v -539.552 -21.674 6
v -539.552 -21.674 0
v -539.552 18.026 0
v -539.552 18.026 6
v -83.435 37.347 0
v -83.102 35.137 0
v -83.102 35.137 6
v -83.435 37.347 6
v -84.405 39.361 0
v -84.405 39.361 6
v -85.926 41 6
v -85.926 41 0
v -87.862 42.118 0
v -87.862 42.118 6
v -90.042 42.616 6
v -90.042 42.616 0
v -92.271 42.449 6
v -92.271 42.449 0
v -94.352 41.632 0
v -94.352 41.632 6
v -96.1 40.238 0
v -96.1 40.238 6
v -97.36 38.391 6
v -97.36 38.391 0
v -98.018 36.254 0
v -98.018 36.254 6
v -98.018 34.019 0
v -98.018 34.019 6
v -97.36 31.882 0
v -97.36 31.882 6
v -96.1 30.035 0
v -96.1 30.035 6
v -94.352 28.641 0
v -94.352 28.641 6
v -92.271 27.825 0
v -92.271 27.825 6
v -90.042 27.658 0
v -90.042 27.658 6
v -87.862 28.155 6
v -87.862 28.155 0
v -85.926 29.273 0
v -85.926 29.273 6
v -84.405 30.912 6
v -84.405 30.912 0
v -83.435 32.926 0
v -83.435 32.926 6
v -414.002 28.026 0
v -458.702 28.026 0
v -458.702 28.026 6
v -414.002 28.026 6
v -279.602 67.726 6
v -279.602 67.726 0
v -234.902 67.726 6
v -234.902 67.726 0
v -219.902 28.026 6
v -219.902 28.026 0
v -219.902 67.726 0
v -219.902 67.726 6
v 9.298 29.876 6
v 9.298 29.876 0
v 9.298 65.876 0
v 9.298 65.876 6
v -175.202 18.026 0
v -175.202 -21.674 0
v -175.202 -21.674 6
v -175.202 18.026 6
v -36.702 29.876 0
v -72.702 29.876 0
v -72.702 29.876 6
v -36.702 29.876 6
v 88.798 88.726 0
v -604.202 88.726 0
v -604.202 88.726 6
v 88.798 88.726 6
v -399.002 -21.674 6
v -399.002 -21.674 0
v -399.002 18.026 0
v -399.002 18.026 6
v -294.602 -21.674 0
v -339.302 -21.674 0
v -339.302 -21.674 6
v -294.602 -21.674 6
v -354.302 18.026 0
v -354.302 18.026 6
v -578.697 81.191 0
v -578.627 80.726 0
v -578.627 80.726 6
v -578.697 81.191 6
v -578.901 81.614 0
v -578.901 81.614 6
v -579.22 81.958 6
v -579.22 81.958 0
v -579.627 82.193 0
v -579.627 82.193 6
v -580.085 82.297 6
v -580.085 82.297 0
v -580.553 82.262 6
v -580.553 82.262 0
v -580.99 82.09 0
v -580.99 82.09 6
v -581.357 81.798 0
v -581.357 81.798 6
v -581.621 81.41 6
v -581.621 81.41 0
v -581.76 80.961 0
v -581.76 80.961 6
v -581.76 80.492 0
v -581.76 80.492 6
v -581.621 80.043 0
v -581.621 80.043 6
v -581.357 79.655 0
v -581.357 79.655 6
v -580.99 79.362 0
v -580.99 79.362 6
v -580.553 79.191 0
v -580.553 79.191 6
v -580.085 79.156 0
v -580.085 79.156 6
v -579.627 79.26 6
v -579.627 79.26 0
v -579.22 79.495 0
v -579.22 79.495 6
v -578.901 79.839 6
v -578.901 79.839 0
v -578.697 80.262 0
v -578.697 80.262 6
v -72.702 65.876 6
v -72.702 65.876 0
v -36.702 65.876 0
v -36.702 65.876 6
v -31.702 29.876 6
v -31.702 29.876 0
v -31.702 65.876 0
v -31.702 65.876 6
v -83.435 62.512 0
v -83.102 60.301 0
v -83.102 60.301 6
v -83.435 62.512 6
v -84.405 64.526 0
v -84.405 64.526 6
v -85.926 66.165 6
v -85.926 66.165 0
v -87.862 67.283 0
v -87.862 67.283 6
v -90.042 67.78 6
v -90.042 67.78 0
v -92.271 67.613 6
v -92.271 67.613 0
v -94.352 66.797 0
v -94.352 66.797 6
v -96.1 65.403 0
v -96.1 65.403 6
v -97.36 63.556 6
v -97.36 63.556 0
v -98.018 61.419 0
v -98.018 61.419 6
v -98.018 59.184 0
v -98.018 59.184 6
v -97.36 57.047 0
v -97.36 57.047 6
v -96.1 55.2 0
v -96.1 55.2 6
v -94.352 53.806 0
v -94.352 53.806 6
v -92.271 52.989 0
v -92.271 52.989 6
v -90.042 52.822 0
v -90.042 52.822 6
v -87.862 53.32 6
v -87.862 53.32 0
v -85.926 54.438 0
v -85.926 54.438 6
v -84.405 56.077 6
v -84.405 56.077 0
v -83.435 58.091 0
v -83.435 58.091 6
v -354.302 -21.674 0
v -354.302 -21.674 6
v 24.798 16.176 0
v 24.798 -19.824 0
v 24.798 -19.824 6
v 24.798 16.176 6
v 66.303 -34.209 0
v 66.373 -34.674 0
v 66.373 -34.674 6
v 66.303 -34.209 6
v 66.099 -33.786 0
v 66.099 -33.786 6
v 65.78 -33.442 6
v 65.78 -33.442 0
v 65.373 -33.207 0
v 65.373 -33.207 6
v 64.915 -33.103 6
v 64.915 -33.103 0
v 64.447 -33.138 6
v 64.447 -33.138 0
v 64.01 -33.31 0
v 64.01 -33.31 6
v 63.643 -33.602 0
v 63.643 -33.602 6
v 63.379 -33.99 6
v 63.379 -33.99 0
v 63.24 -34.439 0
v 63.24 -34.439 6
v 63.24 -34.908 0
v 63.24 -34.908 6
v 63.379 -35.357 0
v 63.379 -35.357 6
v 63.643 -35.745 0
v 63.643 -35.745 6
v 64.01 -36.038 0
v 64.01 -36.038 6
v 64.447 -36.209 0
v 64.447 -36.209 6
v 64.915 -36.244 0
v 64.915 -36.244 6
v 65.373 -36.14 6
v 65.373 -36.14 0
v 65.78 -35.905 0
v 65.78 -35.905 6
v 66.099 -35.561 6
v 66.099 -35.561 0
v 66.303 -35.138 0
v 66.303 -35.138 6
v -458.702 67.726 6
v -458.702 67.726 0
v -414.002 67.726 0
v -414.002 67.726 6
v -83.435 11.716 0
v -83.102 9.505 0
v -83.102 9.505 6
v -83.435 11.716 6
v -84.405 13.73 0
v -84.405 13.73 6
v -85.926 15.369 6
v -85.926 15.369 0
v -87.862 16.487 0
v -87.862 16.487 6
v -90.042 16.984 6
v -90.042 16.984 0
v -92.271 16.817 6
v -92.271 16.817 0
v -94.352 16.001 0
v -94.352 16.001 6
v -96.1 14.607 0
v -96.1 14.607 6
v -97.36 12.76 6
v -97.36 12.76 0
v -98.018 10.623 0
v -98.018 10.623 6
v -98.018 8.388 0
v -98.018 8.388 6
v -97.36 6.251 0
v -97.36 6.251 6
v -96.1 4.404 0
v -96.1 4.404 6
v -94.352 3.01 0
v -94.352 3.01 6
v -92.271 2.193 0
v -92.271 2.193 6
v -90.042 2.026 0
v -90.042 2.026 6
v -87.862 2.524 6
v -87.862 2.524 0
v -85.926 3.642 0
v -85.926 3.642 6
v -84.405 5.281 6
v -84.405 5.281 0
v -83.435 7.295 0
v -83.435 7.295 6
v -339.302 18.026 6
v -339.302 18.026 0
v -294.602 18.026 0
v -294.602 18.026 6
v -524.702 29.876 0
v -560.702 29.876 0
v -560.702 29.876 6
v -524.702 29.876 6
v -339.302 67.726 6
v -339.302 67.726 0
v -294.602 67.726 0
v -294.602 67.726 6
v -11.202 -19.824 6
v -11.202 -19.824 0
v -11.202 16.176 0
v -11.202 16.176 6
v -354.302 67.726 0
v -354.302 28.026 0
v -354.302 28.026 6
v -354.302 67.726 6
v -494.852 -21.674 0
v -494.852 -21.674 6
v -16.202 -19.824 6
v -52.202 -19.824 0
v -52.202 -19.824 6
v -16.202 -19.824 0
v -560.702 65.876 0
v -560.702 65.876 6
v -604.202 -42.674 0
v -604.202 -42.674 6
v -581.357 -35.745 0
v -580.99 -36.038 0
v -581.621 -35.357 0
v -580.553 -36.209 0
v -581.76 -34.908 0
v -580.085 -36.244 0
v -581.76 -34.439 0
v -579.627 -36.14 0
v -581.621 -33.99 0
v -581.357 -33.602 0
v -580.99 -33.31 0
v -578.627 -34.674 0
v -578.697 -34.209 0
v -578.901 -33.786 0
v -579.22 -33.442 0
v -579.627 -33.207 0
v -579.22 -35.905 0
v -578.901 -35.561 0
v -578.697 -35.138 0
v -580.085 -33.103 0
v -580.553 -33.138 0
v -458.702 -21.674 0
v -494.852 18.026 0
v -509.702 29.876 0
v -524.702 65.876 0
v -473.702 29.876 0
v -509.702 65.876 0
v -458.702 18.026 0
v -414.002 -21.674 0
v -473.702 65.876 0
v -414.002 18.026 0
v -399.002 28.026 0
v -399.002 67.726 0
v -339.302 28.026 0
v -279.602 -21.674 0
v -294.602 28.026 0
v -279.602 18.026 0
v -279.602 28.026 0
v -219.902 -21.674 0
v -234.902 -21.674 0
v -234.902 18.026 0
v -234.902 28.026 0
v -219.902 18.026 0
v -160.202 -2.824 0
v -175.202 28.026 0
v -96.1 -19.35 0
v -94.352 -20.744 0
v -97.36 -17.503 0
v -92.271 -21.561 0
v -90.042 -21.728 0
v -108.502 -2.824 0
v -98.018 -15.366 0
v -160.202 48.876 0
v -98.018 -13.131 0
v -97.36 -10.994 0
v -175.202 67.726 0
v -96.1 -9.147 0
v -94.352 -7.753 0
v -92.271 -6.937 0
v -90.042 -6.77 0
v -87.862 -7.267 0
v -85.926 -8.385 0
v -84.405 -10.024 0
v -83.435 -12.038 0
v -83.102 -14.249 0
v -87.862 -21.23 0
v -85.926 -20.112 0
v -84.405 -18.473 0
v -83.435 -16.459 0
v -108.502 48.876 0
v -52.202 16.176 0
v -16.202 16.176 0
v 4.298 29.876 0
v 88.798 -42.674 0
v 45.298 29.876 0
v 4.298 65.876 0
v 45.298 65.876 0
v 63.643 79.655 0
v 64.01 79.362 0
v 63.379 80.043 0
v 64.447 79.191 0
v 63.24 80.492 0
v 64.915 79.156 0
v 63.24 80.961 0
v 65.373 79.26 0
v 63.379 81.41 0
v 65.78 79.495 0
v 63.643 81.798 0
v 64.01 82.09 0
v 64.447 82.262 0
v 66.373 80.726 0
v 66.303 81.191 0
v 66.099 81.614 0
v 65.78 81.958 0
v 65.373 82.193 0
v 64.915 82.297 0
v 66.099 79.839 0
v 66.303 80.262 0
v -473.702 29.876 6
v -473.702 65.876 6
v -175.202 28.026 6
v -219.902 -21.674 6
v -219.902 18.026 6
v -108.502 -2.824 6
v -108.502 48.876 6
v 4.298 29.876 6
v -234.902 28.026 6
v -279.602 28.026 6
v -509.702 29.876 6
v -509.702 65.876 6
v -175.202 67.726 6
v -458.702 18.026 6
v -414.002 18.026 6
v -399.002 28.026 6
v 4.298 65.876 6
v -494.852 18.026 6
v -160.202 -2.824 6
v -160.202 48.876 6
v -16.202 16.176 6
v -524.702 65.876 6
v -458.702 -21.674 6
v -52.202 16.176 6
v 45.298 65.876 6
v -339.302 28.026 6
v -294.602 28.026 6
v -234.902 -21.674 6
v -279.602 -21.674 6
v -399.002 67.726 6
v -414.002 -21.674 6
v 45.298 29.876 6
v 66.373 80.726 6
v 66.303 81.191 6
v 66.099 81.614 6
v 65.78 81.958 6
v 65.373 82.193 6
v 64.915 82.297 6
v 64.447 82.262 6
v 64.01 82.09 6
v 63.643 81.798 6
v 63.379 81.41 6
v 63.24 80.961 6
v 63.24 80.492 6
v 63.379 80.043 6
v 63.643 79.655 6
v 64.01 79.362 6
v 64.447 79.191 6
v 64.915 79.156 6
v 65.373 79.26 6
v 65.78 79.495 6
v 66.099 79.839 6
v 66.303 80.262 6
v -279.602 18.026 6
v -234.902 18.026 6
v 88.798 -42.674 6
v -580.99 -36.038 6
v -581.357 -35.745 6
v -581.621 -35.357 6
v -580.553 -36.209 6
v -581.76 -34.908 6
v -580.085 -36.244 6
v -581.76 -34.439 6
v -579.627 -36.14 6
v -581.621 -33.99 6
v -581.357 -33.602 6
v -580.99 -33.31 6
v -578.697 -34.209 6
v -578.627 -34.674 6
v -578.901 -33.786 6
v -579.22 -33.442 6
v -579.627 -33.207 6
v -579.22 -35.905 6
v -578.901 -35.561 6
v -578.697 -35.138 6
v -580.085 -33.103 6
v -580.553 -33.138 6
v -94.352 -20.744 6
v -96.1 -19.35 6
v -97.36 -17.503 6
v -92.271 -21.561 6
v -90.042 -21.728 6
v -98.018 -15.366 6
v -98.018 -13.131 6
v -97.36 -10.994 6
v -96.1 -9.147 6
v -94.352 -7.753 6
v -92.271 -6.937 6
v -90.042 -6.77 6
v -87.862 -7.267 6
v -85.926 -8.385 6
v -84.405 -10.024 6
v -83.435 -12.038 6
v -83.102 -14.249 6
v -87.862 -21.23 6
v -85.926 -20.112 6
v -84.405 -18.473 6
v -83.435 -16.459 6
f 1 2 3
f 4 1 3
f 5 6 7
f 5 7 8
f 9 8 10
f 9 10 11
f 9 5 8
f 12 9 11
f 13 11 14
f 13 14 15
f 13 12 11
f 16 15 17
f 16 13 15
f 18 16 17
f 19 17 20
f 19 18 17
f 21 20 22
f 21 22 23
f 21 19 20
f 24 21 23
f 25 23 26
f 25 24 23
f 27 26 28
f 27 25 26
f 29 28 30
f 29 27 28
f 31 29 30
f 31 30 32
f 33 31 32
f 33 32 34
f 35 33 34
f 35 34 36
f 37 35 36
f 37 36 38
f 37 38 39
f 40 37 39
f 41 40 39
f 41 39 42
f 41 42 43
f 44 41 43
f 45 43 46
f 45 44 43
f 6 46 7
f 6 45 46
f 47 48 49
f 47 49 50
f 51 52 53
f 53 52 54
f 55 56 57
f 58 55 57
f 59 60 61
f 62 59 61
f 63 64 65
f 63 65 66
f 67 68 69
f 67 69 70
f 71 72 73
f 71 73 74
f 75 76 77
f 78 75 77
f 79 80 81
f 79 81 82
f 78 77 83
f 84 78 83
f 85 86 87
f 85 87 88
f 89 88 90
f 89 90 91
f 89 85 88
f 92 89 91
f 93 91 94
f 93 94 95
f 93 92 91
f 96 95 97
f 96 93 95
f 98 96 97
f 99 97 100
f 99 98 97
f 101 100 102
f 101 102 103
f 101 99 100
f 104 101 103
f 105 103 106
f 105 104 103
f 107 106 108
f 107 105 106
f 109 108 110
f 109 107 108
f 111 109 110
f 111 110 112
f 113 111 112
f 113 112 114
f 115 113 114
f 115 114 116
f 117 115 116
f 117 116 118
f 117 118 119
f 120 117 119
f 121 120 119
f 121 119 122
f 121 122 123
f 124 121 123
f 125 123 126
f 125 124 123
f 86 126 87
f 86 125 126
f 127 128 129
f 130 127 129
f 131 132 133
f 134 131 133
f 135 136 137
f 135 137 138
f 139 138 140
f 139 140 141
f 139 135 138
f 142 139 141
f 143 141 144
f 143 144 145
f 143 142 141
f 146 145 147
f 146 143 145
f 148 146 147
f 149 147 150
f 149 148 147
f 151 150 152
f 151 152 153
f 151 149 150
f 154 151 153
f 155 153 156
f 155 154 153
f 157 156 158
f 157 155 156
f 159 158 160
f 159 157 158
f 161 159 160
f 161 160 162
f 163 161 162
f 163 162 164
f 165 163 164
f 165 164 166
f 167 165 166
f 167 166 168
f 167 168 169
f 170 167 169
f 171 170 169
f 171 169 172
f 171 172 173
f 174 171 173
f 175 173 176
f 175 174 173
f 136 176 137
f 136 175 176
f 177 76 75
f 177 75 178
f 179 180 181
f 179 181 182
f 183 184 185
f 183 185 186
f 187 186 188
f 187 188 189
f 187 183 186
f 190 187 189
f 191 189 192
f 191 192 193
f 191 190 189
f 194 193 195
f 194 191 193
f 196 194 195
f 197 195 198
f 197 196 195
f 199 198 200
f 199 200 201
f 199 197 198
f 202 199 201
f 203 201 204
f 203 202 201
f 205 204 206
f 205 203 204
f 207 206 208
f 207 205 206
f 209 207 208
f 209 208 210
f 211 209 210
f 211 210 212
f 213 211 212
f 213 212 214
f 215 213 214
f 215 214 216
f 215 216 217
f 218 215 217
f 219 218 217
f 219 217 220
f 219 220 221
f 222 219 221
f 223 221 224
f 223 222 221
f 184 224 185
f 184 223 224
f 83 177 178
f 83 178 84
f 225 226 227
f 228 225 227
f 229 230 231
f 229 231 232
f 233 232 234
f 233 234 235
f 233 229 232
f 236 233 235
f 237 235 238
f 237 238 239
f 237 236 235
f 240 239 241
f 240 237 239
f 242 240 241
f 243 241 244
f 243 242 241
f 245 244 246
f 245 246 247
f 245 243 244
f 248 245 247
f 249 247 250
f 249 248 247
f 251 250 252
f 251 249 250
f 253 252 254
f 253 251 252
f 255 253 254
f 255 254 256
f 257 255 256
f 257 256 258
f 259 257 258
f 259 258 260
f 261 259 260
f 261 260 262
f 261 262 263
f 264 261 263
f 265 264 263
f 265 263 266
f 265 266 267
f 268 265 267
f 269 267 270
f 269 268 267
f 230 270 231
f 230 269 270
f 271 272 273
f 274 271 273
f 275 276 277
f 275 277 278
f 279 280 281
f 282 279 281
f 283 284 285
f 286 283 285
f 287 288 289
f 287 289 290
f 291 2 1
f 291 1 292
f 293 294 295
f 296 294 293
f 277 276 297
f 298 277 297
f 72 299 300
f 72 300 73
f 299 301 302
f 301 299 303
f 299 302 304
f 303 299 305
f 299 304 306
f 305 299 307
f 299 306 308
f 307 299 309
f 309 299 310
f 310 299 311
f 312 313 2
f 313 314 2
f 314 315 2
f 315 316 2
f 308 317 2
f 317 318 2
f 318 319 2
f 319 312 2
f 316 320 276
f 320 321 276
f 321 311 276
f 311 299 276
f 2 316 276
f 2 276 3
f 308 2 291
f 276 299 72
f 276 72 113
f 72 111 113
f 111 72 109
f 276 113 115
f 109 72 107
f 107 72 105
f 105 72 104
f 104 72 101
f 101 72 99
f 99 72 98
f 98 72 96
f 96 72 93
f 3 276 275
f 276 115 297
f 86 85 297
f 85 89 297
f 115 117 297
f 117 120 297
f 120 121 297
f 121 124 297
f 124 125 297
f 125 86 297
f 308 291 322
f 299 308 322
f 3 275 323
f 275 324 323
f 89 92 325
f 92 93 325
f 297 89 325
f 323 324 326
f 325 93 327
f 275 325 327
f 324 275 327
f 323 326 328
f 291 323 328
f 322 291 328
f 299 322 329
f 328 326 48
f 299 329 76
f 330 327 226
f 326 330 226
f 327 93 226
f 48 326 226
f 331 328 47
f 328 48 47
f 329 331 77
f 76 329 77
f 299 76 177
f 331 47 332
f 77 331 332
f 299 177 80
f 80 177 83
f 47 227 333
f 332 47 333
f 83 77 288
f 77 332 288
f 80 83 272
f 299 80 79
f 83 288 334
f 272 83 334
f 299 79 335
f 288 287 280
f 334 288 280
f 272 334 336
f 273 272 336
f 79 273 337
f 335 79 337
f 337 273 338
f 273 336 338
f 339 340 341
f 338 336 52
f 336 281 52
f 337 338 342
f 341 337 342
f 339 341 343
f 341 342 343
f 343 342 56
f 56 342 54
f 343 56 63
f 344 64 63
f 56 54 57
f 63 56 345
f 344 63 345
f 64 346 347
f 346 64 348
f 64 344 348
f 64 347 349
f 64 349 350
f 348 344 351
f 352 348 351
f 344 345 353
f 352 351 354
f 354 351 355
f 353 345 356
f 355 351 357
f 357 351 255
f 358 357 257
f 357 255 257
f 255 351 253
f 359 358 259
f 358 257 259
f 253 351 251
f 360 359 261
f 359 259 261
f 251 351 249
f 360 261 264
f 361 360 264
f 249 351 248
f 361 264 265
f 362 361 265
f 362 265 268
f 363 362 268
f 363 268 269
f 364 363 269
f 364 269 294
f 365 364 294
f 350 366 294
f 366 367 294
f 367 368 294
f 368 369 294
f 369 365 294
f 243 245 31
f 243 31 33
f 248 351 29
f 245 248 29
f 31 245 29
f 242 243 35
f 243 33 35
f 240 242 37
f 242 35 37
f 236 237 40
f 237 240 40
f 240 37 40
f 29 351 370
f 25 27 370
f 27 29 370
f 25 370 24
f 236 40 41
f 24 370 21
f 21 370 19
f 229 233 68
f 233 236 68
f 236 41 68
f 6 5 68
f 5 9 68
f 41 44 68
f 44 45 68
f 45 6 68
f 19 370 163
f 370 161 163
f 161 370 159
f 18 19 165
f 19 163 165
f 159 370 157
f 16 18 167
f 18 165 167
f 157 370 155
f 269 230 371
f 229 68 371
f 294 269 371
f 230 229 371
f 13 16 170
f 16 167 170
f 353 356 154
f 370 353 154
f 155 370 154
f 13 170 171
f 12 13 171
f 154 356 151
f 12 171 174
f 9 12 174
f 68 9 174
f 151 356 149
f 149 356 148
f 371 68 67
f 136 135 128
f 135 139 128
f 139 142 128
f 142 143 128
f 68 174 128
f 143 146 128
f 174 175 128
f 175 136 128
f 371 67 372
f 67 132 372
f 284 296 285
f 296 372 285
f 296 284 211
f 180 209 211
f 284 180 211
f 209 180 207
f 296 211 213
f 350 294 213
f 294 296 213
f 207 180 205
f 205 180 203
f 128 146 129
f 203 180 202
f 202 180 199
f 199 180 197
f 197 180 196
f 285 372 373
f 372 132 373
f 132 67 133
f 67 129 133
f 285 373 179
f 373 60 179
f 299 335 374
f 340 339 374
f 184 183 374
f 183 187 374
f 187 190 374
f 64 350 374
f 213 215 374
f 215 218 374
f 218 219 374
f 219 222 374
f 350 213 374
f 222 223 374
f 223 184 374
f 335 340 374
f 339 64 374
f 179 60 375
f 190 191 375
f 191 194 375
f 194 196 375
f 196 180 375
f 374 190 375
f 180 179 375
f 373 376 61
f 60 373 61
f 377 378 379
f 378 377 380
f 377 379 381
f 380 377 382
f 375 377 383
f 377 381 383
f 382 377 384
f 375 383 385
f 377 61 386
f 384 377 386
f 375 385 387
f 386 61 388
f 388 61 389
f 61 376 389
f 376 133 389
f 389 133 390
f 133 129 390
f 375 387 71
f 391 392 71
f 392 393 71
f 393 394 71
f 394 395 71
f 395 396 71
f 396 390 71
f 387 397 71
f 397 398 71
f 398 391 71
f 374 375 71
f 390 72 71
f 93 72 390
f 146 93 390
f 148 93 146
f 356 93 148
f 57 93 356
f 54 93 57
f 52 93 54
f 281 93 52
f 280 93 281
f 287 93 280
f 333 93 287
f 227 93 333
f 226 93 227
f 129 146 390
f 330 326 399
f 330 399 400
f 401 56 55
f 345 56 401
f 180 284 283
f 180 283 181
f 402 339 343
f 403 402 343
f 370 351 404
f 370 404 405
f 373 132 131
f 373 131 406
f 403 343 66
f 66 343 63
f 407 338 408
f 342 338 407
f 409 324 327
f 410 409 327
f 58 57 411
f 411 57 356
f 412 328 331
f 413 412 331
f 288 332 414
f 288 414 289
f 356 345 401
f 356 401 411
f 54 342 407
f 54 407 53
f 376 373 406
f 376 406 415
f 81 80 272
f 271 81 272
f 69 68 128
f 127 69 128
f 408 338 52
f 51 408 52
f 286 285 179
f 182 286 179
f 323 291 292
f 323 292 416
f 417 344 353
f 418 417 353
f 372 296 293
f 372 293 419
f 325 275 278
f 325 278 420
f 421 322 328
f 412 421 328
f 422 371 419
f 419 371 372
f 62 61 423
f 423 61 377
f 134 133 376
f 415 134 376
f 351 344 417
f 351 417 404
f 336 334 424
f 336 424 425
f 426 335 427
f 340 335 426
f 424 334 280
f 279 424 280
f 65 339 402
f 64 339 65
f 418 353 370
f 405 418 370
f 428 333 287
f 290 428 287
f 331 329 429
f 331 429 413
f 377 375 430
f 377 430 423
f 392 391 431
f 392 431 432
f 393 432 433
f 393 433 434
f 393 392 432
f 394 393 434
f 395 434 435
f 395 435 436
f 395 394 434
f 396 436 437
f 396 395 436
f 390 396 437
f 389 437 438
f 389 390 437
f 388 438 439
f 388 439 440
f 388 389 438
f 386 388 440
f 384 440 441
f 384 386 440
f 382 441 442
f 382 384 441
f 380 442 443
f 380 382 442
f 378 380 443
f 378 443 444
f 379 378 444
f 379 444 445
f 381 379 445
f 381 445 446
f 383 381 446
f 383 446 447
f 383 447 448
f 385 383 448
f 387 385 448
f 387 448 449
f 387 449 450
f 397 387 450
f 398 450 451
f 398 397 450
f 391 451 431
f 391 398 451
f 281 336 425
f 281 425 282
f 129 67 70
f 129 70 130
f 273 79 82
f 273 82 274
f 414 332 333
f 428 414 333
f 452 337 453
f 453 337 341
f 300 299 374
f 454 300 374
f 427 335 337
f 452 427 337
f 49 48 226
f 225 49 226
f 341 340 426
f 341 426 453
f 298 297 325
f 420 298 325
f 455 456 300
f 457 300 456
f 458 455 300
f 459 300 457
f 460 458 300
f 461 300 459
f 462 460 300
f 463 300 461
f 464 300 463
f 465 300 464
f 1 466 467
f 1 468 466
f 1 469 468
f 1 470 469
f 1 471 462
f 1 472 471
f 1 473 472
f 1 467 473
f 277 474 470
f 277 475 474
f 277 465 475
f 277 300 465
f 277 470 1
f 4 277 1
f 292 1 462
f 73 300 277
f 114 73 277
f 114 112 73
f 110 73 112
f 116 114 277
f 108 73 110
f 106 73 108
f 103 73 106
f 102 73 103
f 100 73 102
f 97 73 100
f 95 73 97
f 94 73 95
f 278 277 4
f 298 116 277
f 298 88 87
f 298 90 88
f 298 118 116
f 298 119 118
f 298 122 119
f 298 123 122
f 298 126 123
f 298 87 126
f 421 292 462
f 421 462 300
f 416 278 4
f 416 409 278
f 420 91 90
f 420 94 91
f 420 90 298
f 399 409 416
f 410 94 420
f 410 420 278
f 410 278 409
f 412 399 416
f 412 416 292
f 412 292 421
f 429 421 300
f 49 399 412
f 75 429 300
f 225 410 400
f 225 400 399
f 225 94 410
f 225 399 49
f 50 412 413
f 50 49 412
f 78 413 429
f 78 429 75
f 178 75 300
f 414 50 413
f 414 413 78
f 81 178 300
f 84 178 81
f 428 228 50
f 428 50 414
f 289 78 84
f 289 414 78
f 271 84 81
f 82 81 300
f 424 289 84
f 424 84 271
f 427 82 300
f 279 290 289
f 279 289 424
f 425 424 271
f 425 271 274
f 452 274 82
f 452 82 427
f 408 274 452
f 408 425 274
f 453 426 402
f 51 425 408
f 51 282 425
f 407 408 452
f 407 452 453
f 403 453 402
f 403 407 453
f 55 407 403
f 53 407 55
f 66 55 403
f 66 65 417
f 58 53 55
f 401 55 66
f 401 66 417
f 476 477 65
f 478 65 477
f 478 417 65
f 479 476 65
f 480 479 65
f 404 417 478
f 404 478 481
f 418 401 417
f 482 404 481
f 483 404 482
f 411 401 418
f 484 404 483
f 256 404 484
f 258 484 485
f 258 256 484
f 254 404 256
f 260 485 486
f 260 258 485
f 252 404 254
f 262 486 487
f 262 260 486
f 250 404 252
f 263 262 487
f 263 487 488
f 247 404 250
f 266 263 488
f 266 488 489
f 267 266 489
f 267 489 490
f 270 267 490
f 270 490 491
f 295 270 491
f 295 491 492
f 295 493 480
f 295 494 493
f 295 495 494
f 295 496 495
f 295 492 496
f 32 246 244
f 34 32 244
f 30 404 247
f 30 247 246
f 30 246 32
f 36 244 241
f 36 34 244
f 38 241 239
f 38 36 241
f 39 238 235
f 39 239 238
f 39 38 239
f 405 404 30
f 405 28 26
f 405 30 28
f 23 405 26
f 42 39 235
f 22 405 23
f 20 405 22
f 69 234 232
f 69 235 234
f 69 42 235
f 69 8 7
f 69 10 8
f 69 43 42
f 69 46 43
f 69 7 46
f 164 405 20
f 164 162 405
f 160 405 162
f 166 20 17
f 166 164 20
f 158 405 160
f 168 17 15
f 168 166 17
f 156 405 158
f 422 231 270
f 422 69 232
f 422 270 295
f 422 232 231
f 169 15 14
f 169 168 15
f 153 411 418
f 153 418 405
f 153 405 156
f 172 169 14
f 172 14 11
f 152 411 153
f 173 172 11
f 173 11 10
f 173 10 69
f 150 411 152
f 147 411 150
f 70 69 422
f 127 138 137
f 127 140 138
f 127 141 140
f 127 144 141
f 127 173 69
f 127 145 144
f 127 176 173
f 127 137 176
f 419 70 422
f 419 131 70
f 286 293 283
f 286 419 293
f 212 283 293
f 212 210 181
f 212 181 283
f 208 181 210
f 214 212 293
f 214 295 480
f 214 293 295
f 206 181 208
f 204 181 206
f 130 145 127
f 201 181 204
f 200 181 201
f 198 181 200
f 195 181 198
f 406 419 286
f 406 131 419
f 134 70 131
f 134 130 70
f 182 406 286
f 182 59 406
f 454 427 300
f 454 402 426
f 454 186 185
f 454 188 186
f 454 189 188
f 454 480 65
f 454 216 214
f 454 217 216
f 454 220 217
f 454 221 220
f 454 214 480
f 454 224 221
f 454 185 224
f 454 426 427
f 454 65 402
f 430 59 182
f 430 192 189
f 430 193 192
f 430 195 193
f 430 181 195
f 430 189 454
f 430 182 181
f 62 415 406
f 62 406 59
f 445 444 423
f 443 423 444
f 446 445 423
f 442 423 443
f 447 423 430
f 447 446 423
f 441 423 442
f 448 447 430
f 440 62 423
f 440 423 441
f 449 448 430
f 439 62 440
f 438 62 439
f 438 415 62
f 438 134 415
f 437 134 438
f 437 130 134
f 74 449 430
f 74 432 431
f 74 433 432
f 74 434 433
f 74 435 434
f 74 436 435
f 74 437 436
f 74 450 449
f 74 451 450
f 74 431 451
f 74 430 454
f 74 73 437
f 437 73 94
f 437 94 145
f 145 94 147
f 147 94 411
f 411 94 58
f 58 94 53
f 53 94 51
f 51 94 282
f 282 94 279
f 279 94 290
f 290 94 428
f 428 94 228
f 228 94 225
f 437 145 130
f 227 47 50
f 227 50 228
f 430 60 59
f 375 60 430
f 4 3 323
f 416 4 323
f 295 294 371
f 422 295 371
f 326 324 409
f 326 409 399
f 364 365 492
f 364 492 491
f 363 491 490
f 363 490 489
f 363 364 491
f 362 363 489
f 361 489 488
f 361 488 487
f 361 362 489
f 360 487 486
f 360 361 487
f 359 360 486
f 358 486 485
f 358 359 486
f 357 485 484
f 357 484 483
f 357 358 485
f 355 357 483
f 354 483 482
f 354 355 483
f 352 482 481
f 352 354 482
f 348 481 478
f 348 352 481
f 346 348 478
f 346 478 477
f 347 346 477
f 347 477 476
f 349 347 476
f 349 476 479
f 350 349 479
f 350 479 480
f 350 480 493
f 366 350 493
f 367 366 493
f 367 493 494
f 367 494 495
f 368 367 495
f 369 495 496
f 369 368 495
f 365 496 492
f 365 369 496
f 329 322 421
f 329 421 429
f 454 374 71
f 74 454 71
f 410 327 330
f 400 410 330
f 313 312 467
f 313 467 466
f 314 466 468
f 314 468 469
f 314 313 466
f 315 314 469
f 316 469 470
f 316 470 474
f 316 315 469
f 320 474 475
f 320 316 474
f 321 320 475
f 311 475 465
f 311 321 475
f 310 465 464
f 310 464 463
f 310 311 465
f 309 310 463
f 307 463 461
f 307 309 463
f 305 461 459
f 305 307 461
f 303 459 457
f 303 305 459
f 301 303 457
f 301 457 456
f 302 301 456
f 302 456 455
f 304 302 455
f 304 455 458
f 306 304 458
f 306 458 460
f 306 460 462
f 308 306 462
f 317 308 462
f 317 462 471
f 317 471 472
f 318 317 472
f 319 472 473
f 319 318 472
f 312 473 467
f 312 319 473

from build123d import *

# Parameters (mm, degrees)
F0_W     = 693
F0_H     = 131.4
F0_R     = 1.575
F0_W_2   = 44.7
F0_H_2   = 39.7
F0_R_2   = 7.5
F0_W_3   = 36
F0_H_3   = 36
F0_W_4   = 51.7
F0_H_4   = 51.7
F1_DEPTH = 6


with BuildPart() as f1:
    # F0 (on Top) → F1 (new body)
    with BuildSketch(Plane.XY):
        with Locations((-257.70224, 23.026403)):
            Rectangle(F0_W, F0_H)
        with Locations((-580.20224, -34.673597)):
            Circle(F0_R, mode=Mode.SUBTRACT)
        with Locations((-517.20224, -1.823597)):
            Rectangle(F0_W_2, F0_H_2, mode=Mode.SUBTRACT)
        with Locations((-436.35224, -1.823597)):
            Rectangle(F0_W_2, F0_H_2, mode=Mode.SUBTRACT)
        with Locations((-376.65224, -1.823597)):
            Rectangle(F0_W_2, F0_H_2, mode=Mode.SUBTRACT)
        with Locations((-316.95224, -1.823597)):
            Rectangle(F0_W_2, F0_H_2, mode=Mode.SUBTRACT)
        with Locations((-90.60224, -14.248597)):
            Circle(F0_R_2, mode=Mode.SUBTRACT)
        with Locations((64.79776, -34.673597)):
            Circle(F0_R, mode=Mode.SUBTRACT)
        with Locations((-257.25224, -1.823597)):
            Rectangle(F0_W_2, F0_H_2, mode=Mode.SUBTRACT)
        with Locations((-197.55224, -1.823597)):
            Rectangle(F0_W_2, F0_H_2, mode=Mode.SUBTRACT)
        with Locations((-90.60224, 9.505447)):
            Circle(F0_R_2, mode=Mode.SUBTRACT)
        with Locations((-34.20224, -1.823597)):
            Rectangle(F0_W_3, F0_H_3, mode=Mode.SUBTRACT)
        with Locations((6.79776, -1.823597)):
            Rectangle(F0_W_3, F0_H_3, mode=Mode.SUBTRACT)
        with Locations((-542.70224, 47.876403)):
            Rectangle(F0_W_3, F0_H_3, mode=Mode.SUBTRACT)
        with Locations((-491.70224, 47.876403)):
            Rectangle(F0_W_3, F0_H_3, mode=Mode.SUBTRACT)
        with Locations((-436.35224, 47.876403)):
            Rectangle(F0_W_2, F0_H_2, mode=Mode.SUBTRACT)
        with Locations((-376.65224, 47.876403)):
            Rectangle(F0_W_2, F0_H_2, mode=Mode.SUBTRACT)
        with Locations((-316.95224, 47.876403)):
            Rectangle(F0_W_2, F0_H_2, mode=Mode.SUBTRACT)
        with Locations((-580.20224, 80.726403)):
            Circle(F0_R, mode=Mode.SUBTRACT)
        with Locations((-134.35224, 23.026403)):
            Rectangle(F0_W_4, F0_H_4, mode=Mode.SUBTRACT)
        with Locations((-90.60224, 35.136569)):
            Circle(F0_R_2, mode=Mode.SUBTRACT)
        with Locations((-257.25224, 47.876403)):
            Rectangle(F0_W_2, F0_H_2, mode=Mode.SUBTRACT)
        with Locations((-197.55224, 47.876403)):
            Rectangle(F0_W_2, F0_H_2, mode=Mode.SUBTRACT)
        with Locations((-54.70224, 47.876403)):
            Rectangle(F0_W_3, F0_H_3, mode=Mode.SUBTRACT)
        with Locations((-13.70224, 47.876403)):
            Rectangle(F0_W_3, F0_H_3, mode=Mode.SUBTRACT)
        with Locations((27.29776, 47.876403)):
            Rectangle(F0_W_3, F0_H_3, mode=Mode.SUBTRACT)
        with Locations((-90.60224, 60.301403)):
            Circle(F0_R_2, mode=Mode.SUBTRACT)
        with Locations((64.79776, 80.726403)):
            Circle(F0_R, mode=Mode.SUBTRACT)
    extrude(amount=F1_DEPTH)


solid = f1.part
